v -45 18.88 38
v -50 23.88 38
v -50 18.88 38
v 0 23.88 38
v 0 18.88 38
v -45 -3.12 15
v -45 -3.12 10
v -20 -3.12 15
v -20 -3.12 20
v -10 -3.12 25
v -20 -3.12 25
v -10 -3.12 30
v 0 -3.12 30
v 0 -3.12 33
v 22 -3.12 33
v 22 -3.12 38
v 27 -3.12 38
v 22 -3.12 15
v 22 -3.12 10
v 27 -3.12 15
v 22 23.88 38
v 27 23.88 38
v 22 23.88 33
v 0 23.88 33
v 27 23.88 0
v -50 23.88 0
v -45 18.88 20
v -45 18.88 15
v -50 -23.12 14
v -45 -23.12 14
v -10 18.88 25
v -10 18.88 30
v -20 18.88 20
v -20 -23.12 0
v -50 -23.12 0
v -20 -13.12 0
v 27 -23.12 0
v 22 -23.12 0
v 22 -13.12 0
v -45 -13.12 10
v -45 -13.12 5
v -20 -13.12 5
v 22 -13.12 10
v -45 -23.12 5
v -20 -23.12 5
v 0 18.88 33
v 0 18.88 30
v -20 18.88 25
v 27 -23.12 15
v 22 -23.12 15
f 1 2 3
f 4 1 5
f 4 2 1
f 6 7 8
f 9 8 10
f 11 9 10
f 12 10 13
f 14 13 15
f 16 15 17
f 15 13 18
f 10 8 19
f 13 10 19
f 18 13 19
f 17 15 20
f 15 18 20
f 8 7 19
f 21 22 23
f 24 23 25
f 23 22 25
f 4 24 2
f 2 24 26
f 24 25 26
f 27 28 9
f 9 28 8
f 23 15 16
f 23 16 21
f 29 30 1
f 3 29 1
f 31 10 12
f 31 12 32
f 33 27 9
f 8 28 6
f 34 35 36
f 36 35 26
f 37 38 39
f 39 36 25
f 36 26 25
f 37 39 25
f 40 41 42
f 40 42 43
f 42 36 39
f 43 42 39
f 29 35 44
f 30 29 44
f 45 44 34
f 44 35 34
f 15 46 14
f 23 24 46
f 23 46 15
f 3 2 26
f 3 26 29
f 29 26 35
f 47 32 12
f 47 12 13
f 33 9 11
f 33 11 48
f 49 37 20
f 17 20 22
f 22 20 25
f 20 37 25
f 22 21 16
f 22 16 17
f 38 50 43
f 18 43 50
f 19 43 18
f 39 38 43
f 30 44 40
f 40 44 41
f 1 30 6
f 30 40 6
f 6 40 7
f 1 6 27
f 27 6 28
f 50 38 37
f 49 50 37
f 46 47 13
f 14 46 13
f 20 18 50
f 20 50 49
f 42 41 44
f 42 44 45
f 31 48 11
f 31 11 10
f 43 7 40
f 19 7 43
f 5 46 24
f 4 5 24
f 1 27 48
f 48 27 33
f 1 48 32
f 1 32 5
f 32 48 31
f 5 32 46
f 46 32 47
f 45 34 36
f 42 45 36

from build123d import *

# Parameters (mm, degrees)
F1_DEPTH  = 38
F3_DEPTH  = 25
F4_DEPTH  = 38
F0_W      = 25
F0_H      = 10
F5_DEPTH  = 5
F6_DEPTH  = 10
F7_DEPTH  = 15
F0_W_2    = 5
F0_H_2    = 27
F8_DEPTH  = 38
F9_DEPTH  = 33
F10_DEPTH = 15
F11_DEPTH = 20
F0_W_3    = 10
F0_H_3    = 22
F12_DEPTH = 25
F13_DEPTH = 30


with BuildPart() as f1:
    # F0 (on Top) → F1 (new body)
    with BuildSketch(Plane.XY):
        Polygon((-45, 18.8800000995), (-50, 18.8800000995), (-50, -23.1199999005), (-45, -23.1199999005), (-45, -13.1199999005), (-45, -3.1199999005), align=None)
    extrude(amount=F1_DEPTH)

    # F2 (on face) → F3 (cut)
    with BuildSketch(Plane.YZ.offset(-45)):
        Polygon((-23.1199999005, 14), (18.8800000995, 38), (-23.1199999005, 38), align=None)
    extrude(amount=-F3_DEPTH, mode=Mode.SUBTRACT)

    # F0 (on Top) → F4 (join)
    with BuildSketch(Plane.XY):
        Polygon((0, 23.8800000995), (-50, 23.8800000995), (-50, 18.8800000995), (-45, 18.8800000995), (-20, 18.8800000995), (-10, 18.8800000995), (0, 18.8800000995), align=None)
    extrude(amount=F4_DEPTH)

    # F0 (on Top) → F5 (join)
    with BuildSketch(Plane.XY):
        with Locations((-32.5, -18.1199999005)):
            Rectangle(F0_W, F0_H)
    extrude(amount=F5_DEPTH)

    # F0 (on Top) → F6 (join)
    with BuildSketch(Plane.XY):
        Polygon((22, -13.1199999005), (22, -3.1199999005), (0, -3.1199999005), (-10, -3.1199999005), (-20, -3.1199999005), (-45, -3.1199999005), (-45, -13.1199999005), (-20, -13.1199999005), align=None)
    extrude(amount=F6_DEPTH)

    # F0 (on Top) → F7 (join)
    with BuildSketch(Plane.XY):
        Polygon((27, -3.1199999005), (22, -3.1199999005), (22, -13.1199999005), (22, -23.1199999005), (27, -23.1199999005), align=None)
    extrude(amount=F7_DEPTH)

    # F0 (on Top) → F8 (join)
    with BuildSketch(Plane.XY):
        with Locations((24.5, 10.3800000995)):
            Rectangle(F0_W_2, F0_H_2)
    extrude(amount=F8_DEPTH)

    # F0 (on Top) → F9 (join)
    with BuildSketch(Plane.XY):
        Polygon((22, 23.8800000995), (0, 23.8800000995), (0, 18.8800000995), (0, -3.1199999005), (22, -3.1199999005), align=None)
    extrude(amount=F9_DEPTH)

    # F0 (on Top) → F10 (join)
    with BuildSketch(Plane.XY):
        Polygon((-20, -3.1199999005), (-45, 18.8800000995), (-45, -3.1199999005), align=None)
    extrude(amount=F10_DEPTH)

    # F0 (on Top) → F11 (join)
    with BuildSketch(Plane.XY):
        Polygon((-20, 18.8800000995), (-45, 18.8800000995), (-20, -3.1199999005), align=None)
    extrude(amount=F11_DEPTH)

    # F0 (on Top) → F12 (join)
    with BuildSketch(Plane.XY):
        with Locations((-15, 7.8800000995)):
            Rectangle(F0_W_3, F0_H_3)
    extrude(amount=F12_DEPTH)

    # F0 (on Top) → F13 (join)
    with BuildSketch(Plane.XY):
        with Locations((-5, 7.8800000995)):
            Rectangle(F0_W_3, F0_H_3)
    extrude(amount=F13_DEPTH)


solid = f1.part
